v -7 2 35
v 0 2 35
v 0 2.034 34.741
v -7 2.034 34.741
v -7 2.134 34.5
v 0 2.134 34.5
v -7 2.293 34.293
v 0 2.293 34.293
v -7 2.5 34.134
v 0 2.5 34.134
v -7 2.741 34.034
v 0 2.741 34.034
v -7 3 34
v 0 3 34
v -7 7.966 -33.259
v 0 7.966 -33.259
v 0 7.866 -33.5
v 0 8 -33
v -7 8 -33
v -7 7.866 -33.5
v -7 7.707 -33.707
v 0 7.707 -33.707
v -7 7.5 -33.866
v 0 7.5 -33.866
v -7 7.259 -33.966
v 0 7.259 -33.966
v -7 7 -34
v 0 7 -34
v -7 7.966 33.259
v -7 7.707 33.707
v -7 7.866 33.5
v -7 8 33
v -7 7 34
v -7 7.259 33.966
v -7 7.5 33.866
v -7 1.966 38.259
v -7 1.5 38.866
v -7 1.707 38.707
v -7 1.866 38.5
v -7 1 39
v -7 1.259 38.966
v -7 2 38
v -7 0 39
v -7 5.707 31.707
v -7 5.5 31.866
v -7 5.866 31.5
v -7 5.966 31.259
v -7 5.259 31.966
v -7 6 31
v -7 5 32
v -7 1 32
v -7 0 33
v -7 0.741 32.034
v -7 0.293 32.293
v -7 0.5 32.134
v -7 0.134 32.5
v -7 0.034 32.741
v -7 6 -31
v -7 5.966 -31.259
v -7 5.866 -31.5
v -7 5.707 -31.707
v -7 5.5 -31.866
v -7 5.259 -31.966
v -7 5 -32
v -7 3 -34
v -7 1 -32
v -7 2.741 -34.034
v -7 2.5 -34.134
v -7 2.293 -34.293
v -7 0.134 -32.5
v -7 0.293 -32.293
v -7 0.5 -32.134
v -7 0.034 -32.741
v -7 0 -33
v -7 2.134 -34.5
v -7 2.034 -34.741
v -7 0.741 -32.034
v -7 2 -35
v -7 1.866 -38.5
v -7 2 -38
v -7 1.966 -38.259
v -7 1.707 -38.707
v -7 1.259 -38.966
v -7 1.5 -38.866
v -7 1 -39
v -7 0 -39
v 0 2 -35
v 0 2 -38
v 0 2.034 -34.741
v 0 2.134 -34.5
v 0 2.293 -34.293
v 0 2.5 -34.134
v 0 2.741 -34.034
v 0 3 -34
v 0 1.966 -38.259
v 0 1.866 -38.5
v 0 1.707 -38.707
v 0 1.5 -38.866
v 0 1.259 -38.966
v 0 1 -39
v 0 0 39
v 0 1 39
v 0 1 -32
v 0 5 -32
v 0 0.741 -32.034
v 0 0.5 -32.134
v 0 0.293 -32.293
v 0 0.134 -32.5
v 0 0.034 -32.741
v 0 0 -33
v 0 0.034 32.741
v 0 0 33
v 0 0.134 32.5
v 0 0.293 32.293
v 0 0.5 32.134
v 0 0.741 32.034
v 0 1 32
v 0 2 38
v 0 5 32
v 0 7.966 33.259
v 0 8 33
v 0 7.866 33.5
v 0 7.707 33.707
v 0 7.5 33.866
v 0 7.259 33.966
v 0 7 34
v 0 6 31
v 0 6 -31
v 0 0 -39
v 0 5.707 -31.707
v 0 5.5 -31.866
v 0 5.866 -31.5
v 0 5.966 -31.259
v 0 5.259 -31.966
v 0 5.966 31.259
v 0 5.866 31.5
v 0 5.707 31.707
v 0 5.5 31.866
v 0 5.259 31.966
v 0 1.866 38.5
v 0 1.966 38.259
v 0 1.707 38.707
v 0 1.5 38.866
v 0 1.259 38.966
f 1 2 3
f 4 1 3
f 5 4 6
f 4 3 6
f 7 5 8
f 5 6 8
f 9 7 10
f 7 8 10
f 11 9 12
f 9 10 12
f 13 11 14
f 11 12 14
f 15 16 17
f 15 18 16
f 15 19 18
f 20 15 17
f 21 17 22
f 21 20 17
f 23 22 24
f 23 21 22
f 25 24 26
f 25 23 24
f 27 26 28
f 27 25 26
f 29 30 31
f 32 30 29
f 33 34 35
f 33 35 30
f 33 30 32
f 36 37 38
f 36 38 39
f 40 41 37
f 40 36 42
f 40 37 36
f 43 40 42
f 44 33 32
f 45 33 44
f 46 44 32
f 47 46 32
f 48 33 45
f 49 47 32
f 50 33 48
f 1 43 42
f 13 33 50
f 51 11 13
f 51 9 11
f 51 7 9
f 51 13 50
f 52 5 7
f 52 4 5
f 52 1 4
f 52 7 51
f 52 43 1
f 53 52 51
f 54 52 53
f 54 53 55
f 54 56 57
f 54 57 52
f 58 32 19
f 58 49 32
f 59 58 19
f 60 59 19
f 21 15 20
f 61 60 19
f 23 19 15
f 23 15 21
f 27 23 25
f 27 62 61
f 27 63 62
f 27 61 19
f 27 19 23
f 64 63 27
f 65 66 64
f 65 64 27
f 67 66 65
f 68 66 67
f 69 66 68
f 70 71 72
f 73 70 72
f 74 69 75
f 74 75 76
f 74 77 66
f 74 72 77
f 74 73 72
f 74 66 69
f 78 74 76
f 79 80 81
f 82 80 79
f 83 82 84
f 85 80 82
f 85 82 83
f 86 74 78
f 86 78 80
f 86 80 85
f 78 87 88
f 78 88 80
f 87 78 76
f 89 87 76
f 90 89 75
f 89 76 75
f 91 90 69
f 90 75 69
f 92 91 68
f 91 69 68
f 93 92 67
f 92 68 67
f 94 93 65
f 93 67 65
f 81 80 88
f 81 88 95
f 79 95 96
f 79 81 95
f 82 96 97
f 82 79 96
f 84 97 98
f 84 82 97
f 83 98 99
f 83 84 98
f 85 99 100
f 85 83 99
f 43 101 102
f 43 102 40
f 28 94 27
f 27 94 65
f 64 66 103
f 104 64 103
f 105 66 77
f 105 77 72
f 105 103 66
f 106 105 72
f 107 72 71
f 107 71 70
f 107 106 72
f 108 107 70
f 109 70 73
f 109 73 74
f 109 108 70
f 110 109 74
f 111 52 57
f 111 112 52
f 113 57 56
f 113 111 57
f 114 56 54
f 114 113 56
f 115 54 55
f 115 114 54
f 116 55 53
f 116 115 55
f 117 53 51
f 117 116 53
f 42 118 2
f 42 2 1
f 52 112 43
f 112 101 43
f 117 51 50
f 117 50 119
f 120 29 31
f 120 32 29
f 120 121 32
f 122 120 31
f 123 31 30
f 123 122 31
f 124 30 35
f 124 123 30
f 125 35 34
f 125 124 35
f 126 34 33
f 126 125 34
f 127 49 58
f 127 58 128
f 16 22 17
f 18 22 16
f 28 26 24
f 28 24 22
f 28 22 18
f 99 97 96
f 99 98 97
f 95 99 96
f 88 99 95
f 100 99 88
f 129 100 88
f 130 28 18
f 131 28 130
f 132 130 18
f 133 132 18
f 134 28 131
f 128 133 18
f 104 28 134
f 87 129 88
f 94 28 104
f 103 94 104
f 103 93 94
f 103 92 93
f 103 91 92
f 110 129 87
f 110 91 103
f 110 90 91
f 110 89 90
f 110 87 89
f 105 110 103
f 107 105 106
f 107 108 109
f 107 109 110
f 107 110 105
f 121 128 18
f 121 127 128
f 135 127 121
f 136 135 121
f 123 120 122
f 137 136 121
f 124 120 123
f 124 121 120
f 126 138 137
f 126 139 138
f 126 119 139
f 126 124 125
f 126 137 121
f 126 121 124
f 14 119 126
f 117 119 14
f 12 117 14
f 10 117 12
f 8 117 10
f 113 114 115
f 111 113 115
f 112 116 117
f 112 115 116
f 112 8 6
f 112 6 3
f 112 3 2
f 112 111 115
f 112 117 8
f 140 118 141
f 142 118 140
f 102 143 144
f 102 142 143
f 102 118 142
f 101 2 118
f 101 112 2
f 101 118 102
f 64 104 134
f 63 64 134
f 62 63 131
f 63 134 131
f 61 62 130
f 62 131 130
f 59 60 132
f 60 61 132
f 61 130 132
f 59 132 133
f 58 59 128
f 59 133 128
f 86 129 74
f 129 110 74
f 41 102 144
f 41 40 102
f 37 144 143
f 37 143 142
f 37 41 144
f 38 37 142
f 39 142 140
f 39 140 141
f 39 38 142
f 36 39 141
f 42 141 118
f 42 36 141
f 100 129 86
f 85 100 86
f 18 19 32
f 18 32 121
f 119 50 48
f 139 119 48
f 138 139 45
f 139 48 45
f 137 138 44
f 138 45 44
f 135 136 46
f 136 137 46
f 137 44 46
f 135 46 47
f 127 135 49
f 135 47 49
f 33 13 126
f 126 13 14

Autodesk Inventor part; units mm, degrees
ref_plane "YZ Plane" through (0, 0, 0) normal (1, 0, 0) x (0, 1, 0)
ref_plane "XZ Plane" through (0, 0, 0) normal (0, 1, 0) x (-1, 0, 0)
ref_plane "XY Plane" through (0, 0, 0) normal (0, 0, 1) x (1, 0, 0)
sketch "Sketch1" plane through (0, 0, 0) normal (0, 1, 0) x (-1, 0, 0)
  line L0 (0, 39) -> (7, 39)
  line L1 (7, 39) -> (7, 32)
  line L2 (7, 32) -> (0, 32)
  line L3 (0, 32) -> (0, 39)
  line L4 (7, -32) -> (0, -32)
  line L5 (0, -32) -> (0, -39)
  line L6 (0, -39) -> (7, -39)
  line L7 (7, -39) -> (7, -32)
  line L8 (7, 32) -> (7, -32) construction
  point P0 (0, 0)
  point P1 (7, 0)
  dimension "d0" = 78
  dimension "d1" = 7
extrude "Extrusion1" add sketch "Sketch1" along normal blind 2
sketch "Sketch2" plane through (0, 2, 0) normal (0, 1, 0) x (1, 0, 0)
  line L0 (-7, -32) -> (-7, -39) projected
  line L1 (0, 32) -> (0, 39) projected
  line L2 (-7, -34) -> (0, -34)
  line L3 (0, -34) -> (0, 34)
  line L4 (0, 34) -> (-7, 34)
  line L5 (-7, 34) -> (-7, -34)
  line L6 (0, -32) -> (-7, -32) projected
  line L7 (-7, 32) -> (0, 32) projected
  point P0 (0, 0)
  dimension "d4" = 2
  dimension "d5" = 2
extrude "Extrusion2" add sketch "Sketch2" along normal blind 4 contours L6 L3 L2 L0 | L5 L4 L1 L7
sketch "Sketch3" plane through (0, 6, 0) normal (0, 1, 0) x (1, 0, 0)
  line L0 (-7, -34) -> (0, -34) projected
  line L1 (0, 34) -> (-7, 34) projected
  line L2 (0, -34) -> (-7, -34)
  line L3 (-7, -34) -> (-7, 34)
  line L4 (-7, 34) -> (0, 34)
  line L5 (0, 34) -> (0, -34)
  point P0 (0, 0)
extrude "Extrusion3" add sketch "Sketch3" along normal blind 2
fillet "Fillet3" radius 1 9 edges at (-3.5, 2, 34) (-3.5, 2, 39) (-3.5, 2, -34) (-3.5, 0, 32) (-3.5, 0, -32) (-3.5, 6, -32) (-3.5, 6, 32) (-3.5, 8, -34) (-3.5, 8, 34)
fillet "Fillet4" radius 1 1 edges at (-3.5, 2, -39)
properties part number "neotrellis_support"
